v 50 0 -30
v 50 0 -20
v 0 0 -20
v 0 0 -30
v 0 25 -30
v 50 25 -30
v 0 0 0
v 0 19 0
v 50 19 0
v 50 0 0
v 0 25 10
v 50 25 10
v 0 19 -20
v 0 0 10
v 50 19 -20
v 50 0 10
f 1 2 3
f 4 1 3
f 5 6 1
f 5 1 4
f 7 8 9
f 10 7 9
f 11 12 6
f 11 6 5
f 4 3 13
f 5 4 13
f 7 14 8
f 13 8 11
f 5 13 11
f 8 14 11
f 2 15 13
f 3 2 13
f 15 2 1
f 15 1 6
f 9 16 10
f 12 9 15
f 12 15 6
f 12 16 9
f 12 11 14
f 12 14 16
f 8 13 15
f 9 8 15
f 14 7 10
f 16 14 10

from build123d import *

# Parameters (mm, degrees)
ESBO_O1_W                = 50
ESBO_O1_H                = 25
RESSALTO_EXTRUS_O1_DEPTH = 10
ESBO_O2_W                = 50
ESBO_O2_H                = 20
RESSALTO_EXTRUS_O2_DEPTH = 6
ESBO_O3_W                = 50
ESBO_O3_H                = 25
RESSALTO_EXTRUS_O3_DEPTH = 10


with BuildPart() as part:
    # Esboço1 → Ressalto-extrusão1 (new body)
    with BuildSketch(Plane.XY):
        with Locations((25, 12.5)):
            Rectangle(ESBO_O1_W, ESBO_O1_H)
    extrude(amount=RESSALTO_EXTRUS_O1_DEPTH)

    # Esboço2 → Ressalto-extrusão2 (add)
    with BuildSketch(Plane(origin=(0, 25, 0), x_dir=(1, 0, 0), z_dir=(0, 1, 0))):
        with Locations((25, 10)):
            Rectangle(ESBO_O2_W, ESBO_O2_H)
    extrude(amount=-RESSALTO_EXTRUS_O2_DEPTH)

    # Esboço3 → Ressalto-extrusão3 (add)
    with BuildSketch(Plane(origin=(0, 0, -20), x_dir=(-1, 0, 0), z_dir=(0, 0, -1))):
        with Locations((-25, 12.5)):
            Rectangle(ESBO_O3_W, ESBO_O3_H)
    extrude(amount=RESSALTO_EXTRUS_O3_DEPTH)


solid = part.part
